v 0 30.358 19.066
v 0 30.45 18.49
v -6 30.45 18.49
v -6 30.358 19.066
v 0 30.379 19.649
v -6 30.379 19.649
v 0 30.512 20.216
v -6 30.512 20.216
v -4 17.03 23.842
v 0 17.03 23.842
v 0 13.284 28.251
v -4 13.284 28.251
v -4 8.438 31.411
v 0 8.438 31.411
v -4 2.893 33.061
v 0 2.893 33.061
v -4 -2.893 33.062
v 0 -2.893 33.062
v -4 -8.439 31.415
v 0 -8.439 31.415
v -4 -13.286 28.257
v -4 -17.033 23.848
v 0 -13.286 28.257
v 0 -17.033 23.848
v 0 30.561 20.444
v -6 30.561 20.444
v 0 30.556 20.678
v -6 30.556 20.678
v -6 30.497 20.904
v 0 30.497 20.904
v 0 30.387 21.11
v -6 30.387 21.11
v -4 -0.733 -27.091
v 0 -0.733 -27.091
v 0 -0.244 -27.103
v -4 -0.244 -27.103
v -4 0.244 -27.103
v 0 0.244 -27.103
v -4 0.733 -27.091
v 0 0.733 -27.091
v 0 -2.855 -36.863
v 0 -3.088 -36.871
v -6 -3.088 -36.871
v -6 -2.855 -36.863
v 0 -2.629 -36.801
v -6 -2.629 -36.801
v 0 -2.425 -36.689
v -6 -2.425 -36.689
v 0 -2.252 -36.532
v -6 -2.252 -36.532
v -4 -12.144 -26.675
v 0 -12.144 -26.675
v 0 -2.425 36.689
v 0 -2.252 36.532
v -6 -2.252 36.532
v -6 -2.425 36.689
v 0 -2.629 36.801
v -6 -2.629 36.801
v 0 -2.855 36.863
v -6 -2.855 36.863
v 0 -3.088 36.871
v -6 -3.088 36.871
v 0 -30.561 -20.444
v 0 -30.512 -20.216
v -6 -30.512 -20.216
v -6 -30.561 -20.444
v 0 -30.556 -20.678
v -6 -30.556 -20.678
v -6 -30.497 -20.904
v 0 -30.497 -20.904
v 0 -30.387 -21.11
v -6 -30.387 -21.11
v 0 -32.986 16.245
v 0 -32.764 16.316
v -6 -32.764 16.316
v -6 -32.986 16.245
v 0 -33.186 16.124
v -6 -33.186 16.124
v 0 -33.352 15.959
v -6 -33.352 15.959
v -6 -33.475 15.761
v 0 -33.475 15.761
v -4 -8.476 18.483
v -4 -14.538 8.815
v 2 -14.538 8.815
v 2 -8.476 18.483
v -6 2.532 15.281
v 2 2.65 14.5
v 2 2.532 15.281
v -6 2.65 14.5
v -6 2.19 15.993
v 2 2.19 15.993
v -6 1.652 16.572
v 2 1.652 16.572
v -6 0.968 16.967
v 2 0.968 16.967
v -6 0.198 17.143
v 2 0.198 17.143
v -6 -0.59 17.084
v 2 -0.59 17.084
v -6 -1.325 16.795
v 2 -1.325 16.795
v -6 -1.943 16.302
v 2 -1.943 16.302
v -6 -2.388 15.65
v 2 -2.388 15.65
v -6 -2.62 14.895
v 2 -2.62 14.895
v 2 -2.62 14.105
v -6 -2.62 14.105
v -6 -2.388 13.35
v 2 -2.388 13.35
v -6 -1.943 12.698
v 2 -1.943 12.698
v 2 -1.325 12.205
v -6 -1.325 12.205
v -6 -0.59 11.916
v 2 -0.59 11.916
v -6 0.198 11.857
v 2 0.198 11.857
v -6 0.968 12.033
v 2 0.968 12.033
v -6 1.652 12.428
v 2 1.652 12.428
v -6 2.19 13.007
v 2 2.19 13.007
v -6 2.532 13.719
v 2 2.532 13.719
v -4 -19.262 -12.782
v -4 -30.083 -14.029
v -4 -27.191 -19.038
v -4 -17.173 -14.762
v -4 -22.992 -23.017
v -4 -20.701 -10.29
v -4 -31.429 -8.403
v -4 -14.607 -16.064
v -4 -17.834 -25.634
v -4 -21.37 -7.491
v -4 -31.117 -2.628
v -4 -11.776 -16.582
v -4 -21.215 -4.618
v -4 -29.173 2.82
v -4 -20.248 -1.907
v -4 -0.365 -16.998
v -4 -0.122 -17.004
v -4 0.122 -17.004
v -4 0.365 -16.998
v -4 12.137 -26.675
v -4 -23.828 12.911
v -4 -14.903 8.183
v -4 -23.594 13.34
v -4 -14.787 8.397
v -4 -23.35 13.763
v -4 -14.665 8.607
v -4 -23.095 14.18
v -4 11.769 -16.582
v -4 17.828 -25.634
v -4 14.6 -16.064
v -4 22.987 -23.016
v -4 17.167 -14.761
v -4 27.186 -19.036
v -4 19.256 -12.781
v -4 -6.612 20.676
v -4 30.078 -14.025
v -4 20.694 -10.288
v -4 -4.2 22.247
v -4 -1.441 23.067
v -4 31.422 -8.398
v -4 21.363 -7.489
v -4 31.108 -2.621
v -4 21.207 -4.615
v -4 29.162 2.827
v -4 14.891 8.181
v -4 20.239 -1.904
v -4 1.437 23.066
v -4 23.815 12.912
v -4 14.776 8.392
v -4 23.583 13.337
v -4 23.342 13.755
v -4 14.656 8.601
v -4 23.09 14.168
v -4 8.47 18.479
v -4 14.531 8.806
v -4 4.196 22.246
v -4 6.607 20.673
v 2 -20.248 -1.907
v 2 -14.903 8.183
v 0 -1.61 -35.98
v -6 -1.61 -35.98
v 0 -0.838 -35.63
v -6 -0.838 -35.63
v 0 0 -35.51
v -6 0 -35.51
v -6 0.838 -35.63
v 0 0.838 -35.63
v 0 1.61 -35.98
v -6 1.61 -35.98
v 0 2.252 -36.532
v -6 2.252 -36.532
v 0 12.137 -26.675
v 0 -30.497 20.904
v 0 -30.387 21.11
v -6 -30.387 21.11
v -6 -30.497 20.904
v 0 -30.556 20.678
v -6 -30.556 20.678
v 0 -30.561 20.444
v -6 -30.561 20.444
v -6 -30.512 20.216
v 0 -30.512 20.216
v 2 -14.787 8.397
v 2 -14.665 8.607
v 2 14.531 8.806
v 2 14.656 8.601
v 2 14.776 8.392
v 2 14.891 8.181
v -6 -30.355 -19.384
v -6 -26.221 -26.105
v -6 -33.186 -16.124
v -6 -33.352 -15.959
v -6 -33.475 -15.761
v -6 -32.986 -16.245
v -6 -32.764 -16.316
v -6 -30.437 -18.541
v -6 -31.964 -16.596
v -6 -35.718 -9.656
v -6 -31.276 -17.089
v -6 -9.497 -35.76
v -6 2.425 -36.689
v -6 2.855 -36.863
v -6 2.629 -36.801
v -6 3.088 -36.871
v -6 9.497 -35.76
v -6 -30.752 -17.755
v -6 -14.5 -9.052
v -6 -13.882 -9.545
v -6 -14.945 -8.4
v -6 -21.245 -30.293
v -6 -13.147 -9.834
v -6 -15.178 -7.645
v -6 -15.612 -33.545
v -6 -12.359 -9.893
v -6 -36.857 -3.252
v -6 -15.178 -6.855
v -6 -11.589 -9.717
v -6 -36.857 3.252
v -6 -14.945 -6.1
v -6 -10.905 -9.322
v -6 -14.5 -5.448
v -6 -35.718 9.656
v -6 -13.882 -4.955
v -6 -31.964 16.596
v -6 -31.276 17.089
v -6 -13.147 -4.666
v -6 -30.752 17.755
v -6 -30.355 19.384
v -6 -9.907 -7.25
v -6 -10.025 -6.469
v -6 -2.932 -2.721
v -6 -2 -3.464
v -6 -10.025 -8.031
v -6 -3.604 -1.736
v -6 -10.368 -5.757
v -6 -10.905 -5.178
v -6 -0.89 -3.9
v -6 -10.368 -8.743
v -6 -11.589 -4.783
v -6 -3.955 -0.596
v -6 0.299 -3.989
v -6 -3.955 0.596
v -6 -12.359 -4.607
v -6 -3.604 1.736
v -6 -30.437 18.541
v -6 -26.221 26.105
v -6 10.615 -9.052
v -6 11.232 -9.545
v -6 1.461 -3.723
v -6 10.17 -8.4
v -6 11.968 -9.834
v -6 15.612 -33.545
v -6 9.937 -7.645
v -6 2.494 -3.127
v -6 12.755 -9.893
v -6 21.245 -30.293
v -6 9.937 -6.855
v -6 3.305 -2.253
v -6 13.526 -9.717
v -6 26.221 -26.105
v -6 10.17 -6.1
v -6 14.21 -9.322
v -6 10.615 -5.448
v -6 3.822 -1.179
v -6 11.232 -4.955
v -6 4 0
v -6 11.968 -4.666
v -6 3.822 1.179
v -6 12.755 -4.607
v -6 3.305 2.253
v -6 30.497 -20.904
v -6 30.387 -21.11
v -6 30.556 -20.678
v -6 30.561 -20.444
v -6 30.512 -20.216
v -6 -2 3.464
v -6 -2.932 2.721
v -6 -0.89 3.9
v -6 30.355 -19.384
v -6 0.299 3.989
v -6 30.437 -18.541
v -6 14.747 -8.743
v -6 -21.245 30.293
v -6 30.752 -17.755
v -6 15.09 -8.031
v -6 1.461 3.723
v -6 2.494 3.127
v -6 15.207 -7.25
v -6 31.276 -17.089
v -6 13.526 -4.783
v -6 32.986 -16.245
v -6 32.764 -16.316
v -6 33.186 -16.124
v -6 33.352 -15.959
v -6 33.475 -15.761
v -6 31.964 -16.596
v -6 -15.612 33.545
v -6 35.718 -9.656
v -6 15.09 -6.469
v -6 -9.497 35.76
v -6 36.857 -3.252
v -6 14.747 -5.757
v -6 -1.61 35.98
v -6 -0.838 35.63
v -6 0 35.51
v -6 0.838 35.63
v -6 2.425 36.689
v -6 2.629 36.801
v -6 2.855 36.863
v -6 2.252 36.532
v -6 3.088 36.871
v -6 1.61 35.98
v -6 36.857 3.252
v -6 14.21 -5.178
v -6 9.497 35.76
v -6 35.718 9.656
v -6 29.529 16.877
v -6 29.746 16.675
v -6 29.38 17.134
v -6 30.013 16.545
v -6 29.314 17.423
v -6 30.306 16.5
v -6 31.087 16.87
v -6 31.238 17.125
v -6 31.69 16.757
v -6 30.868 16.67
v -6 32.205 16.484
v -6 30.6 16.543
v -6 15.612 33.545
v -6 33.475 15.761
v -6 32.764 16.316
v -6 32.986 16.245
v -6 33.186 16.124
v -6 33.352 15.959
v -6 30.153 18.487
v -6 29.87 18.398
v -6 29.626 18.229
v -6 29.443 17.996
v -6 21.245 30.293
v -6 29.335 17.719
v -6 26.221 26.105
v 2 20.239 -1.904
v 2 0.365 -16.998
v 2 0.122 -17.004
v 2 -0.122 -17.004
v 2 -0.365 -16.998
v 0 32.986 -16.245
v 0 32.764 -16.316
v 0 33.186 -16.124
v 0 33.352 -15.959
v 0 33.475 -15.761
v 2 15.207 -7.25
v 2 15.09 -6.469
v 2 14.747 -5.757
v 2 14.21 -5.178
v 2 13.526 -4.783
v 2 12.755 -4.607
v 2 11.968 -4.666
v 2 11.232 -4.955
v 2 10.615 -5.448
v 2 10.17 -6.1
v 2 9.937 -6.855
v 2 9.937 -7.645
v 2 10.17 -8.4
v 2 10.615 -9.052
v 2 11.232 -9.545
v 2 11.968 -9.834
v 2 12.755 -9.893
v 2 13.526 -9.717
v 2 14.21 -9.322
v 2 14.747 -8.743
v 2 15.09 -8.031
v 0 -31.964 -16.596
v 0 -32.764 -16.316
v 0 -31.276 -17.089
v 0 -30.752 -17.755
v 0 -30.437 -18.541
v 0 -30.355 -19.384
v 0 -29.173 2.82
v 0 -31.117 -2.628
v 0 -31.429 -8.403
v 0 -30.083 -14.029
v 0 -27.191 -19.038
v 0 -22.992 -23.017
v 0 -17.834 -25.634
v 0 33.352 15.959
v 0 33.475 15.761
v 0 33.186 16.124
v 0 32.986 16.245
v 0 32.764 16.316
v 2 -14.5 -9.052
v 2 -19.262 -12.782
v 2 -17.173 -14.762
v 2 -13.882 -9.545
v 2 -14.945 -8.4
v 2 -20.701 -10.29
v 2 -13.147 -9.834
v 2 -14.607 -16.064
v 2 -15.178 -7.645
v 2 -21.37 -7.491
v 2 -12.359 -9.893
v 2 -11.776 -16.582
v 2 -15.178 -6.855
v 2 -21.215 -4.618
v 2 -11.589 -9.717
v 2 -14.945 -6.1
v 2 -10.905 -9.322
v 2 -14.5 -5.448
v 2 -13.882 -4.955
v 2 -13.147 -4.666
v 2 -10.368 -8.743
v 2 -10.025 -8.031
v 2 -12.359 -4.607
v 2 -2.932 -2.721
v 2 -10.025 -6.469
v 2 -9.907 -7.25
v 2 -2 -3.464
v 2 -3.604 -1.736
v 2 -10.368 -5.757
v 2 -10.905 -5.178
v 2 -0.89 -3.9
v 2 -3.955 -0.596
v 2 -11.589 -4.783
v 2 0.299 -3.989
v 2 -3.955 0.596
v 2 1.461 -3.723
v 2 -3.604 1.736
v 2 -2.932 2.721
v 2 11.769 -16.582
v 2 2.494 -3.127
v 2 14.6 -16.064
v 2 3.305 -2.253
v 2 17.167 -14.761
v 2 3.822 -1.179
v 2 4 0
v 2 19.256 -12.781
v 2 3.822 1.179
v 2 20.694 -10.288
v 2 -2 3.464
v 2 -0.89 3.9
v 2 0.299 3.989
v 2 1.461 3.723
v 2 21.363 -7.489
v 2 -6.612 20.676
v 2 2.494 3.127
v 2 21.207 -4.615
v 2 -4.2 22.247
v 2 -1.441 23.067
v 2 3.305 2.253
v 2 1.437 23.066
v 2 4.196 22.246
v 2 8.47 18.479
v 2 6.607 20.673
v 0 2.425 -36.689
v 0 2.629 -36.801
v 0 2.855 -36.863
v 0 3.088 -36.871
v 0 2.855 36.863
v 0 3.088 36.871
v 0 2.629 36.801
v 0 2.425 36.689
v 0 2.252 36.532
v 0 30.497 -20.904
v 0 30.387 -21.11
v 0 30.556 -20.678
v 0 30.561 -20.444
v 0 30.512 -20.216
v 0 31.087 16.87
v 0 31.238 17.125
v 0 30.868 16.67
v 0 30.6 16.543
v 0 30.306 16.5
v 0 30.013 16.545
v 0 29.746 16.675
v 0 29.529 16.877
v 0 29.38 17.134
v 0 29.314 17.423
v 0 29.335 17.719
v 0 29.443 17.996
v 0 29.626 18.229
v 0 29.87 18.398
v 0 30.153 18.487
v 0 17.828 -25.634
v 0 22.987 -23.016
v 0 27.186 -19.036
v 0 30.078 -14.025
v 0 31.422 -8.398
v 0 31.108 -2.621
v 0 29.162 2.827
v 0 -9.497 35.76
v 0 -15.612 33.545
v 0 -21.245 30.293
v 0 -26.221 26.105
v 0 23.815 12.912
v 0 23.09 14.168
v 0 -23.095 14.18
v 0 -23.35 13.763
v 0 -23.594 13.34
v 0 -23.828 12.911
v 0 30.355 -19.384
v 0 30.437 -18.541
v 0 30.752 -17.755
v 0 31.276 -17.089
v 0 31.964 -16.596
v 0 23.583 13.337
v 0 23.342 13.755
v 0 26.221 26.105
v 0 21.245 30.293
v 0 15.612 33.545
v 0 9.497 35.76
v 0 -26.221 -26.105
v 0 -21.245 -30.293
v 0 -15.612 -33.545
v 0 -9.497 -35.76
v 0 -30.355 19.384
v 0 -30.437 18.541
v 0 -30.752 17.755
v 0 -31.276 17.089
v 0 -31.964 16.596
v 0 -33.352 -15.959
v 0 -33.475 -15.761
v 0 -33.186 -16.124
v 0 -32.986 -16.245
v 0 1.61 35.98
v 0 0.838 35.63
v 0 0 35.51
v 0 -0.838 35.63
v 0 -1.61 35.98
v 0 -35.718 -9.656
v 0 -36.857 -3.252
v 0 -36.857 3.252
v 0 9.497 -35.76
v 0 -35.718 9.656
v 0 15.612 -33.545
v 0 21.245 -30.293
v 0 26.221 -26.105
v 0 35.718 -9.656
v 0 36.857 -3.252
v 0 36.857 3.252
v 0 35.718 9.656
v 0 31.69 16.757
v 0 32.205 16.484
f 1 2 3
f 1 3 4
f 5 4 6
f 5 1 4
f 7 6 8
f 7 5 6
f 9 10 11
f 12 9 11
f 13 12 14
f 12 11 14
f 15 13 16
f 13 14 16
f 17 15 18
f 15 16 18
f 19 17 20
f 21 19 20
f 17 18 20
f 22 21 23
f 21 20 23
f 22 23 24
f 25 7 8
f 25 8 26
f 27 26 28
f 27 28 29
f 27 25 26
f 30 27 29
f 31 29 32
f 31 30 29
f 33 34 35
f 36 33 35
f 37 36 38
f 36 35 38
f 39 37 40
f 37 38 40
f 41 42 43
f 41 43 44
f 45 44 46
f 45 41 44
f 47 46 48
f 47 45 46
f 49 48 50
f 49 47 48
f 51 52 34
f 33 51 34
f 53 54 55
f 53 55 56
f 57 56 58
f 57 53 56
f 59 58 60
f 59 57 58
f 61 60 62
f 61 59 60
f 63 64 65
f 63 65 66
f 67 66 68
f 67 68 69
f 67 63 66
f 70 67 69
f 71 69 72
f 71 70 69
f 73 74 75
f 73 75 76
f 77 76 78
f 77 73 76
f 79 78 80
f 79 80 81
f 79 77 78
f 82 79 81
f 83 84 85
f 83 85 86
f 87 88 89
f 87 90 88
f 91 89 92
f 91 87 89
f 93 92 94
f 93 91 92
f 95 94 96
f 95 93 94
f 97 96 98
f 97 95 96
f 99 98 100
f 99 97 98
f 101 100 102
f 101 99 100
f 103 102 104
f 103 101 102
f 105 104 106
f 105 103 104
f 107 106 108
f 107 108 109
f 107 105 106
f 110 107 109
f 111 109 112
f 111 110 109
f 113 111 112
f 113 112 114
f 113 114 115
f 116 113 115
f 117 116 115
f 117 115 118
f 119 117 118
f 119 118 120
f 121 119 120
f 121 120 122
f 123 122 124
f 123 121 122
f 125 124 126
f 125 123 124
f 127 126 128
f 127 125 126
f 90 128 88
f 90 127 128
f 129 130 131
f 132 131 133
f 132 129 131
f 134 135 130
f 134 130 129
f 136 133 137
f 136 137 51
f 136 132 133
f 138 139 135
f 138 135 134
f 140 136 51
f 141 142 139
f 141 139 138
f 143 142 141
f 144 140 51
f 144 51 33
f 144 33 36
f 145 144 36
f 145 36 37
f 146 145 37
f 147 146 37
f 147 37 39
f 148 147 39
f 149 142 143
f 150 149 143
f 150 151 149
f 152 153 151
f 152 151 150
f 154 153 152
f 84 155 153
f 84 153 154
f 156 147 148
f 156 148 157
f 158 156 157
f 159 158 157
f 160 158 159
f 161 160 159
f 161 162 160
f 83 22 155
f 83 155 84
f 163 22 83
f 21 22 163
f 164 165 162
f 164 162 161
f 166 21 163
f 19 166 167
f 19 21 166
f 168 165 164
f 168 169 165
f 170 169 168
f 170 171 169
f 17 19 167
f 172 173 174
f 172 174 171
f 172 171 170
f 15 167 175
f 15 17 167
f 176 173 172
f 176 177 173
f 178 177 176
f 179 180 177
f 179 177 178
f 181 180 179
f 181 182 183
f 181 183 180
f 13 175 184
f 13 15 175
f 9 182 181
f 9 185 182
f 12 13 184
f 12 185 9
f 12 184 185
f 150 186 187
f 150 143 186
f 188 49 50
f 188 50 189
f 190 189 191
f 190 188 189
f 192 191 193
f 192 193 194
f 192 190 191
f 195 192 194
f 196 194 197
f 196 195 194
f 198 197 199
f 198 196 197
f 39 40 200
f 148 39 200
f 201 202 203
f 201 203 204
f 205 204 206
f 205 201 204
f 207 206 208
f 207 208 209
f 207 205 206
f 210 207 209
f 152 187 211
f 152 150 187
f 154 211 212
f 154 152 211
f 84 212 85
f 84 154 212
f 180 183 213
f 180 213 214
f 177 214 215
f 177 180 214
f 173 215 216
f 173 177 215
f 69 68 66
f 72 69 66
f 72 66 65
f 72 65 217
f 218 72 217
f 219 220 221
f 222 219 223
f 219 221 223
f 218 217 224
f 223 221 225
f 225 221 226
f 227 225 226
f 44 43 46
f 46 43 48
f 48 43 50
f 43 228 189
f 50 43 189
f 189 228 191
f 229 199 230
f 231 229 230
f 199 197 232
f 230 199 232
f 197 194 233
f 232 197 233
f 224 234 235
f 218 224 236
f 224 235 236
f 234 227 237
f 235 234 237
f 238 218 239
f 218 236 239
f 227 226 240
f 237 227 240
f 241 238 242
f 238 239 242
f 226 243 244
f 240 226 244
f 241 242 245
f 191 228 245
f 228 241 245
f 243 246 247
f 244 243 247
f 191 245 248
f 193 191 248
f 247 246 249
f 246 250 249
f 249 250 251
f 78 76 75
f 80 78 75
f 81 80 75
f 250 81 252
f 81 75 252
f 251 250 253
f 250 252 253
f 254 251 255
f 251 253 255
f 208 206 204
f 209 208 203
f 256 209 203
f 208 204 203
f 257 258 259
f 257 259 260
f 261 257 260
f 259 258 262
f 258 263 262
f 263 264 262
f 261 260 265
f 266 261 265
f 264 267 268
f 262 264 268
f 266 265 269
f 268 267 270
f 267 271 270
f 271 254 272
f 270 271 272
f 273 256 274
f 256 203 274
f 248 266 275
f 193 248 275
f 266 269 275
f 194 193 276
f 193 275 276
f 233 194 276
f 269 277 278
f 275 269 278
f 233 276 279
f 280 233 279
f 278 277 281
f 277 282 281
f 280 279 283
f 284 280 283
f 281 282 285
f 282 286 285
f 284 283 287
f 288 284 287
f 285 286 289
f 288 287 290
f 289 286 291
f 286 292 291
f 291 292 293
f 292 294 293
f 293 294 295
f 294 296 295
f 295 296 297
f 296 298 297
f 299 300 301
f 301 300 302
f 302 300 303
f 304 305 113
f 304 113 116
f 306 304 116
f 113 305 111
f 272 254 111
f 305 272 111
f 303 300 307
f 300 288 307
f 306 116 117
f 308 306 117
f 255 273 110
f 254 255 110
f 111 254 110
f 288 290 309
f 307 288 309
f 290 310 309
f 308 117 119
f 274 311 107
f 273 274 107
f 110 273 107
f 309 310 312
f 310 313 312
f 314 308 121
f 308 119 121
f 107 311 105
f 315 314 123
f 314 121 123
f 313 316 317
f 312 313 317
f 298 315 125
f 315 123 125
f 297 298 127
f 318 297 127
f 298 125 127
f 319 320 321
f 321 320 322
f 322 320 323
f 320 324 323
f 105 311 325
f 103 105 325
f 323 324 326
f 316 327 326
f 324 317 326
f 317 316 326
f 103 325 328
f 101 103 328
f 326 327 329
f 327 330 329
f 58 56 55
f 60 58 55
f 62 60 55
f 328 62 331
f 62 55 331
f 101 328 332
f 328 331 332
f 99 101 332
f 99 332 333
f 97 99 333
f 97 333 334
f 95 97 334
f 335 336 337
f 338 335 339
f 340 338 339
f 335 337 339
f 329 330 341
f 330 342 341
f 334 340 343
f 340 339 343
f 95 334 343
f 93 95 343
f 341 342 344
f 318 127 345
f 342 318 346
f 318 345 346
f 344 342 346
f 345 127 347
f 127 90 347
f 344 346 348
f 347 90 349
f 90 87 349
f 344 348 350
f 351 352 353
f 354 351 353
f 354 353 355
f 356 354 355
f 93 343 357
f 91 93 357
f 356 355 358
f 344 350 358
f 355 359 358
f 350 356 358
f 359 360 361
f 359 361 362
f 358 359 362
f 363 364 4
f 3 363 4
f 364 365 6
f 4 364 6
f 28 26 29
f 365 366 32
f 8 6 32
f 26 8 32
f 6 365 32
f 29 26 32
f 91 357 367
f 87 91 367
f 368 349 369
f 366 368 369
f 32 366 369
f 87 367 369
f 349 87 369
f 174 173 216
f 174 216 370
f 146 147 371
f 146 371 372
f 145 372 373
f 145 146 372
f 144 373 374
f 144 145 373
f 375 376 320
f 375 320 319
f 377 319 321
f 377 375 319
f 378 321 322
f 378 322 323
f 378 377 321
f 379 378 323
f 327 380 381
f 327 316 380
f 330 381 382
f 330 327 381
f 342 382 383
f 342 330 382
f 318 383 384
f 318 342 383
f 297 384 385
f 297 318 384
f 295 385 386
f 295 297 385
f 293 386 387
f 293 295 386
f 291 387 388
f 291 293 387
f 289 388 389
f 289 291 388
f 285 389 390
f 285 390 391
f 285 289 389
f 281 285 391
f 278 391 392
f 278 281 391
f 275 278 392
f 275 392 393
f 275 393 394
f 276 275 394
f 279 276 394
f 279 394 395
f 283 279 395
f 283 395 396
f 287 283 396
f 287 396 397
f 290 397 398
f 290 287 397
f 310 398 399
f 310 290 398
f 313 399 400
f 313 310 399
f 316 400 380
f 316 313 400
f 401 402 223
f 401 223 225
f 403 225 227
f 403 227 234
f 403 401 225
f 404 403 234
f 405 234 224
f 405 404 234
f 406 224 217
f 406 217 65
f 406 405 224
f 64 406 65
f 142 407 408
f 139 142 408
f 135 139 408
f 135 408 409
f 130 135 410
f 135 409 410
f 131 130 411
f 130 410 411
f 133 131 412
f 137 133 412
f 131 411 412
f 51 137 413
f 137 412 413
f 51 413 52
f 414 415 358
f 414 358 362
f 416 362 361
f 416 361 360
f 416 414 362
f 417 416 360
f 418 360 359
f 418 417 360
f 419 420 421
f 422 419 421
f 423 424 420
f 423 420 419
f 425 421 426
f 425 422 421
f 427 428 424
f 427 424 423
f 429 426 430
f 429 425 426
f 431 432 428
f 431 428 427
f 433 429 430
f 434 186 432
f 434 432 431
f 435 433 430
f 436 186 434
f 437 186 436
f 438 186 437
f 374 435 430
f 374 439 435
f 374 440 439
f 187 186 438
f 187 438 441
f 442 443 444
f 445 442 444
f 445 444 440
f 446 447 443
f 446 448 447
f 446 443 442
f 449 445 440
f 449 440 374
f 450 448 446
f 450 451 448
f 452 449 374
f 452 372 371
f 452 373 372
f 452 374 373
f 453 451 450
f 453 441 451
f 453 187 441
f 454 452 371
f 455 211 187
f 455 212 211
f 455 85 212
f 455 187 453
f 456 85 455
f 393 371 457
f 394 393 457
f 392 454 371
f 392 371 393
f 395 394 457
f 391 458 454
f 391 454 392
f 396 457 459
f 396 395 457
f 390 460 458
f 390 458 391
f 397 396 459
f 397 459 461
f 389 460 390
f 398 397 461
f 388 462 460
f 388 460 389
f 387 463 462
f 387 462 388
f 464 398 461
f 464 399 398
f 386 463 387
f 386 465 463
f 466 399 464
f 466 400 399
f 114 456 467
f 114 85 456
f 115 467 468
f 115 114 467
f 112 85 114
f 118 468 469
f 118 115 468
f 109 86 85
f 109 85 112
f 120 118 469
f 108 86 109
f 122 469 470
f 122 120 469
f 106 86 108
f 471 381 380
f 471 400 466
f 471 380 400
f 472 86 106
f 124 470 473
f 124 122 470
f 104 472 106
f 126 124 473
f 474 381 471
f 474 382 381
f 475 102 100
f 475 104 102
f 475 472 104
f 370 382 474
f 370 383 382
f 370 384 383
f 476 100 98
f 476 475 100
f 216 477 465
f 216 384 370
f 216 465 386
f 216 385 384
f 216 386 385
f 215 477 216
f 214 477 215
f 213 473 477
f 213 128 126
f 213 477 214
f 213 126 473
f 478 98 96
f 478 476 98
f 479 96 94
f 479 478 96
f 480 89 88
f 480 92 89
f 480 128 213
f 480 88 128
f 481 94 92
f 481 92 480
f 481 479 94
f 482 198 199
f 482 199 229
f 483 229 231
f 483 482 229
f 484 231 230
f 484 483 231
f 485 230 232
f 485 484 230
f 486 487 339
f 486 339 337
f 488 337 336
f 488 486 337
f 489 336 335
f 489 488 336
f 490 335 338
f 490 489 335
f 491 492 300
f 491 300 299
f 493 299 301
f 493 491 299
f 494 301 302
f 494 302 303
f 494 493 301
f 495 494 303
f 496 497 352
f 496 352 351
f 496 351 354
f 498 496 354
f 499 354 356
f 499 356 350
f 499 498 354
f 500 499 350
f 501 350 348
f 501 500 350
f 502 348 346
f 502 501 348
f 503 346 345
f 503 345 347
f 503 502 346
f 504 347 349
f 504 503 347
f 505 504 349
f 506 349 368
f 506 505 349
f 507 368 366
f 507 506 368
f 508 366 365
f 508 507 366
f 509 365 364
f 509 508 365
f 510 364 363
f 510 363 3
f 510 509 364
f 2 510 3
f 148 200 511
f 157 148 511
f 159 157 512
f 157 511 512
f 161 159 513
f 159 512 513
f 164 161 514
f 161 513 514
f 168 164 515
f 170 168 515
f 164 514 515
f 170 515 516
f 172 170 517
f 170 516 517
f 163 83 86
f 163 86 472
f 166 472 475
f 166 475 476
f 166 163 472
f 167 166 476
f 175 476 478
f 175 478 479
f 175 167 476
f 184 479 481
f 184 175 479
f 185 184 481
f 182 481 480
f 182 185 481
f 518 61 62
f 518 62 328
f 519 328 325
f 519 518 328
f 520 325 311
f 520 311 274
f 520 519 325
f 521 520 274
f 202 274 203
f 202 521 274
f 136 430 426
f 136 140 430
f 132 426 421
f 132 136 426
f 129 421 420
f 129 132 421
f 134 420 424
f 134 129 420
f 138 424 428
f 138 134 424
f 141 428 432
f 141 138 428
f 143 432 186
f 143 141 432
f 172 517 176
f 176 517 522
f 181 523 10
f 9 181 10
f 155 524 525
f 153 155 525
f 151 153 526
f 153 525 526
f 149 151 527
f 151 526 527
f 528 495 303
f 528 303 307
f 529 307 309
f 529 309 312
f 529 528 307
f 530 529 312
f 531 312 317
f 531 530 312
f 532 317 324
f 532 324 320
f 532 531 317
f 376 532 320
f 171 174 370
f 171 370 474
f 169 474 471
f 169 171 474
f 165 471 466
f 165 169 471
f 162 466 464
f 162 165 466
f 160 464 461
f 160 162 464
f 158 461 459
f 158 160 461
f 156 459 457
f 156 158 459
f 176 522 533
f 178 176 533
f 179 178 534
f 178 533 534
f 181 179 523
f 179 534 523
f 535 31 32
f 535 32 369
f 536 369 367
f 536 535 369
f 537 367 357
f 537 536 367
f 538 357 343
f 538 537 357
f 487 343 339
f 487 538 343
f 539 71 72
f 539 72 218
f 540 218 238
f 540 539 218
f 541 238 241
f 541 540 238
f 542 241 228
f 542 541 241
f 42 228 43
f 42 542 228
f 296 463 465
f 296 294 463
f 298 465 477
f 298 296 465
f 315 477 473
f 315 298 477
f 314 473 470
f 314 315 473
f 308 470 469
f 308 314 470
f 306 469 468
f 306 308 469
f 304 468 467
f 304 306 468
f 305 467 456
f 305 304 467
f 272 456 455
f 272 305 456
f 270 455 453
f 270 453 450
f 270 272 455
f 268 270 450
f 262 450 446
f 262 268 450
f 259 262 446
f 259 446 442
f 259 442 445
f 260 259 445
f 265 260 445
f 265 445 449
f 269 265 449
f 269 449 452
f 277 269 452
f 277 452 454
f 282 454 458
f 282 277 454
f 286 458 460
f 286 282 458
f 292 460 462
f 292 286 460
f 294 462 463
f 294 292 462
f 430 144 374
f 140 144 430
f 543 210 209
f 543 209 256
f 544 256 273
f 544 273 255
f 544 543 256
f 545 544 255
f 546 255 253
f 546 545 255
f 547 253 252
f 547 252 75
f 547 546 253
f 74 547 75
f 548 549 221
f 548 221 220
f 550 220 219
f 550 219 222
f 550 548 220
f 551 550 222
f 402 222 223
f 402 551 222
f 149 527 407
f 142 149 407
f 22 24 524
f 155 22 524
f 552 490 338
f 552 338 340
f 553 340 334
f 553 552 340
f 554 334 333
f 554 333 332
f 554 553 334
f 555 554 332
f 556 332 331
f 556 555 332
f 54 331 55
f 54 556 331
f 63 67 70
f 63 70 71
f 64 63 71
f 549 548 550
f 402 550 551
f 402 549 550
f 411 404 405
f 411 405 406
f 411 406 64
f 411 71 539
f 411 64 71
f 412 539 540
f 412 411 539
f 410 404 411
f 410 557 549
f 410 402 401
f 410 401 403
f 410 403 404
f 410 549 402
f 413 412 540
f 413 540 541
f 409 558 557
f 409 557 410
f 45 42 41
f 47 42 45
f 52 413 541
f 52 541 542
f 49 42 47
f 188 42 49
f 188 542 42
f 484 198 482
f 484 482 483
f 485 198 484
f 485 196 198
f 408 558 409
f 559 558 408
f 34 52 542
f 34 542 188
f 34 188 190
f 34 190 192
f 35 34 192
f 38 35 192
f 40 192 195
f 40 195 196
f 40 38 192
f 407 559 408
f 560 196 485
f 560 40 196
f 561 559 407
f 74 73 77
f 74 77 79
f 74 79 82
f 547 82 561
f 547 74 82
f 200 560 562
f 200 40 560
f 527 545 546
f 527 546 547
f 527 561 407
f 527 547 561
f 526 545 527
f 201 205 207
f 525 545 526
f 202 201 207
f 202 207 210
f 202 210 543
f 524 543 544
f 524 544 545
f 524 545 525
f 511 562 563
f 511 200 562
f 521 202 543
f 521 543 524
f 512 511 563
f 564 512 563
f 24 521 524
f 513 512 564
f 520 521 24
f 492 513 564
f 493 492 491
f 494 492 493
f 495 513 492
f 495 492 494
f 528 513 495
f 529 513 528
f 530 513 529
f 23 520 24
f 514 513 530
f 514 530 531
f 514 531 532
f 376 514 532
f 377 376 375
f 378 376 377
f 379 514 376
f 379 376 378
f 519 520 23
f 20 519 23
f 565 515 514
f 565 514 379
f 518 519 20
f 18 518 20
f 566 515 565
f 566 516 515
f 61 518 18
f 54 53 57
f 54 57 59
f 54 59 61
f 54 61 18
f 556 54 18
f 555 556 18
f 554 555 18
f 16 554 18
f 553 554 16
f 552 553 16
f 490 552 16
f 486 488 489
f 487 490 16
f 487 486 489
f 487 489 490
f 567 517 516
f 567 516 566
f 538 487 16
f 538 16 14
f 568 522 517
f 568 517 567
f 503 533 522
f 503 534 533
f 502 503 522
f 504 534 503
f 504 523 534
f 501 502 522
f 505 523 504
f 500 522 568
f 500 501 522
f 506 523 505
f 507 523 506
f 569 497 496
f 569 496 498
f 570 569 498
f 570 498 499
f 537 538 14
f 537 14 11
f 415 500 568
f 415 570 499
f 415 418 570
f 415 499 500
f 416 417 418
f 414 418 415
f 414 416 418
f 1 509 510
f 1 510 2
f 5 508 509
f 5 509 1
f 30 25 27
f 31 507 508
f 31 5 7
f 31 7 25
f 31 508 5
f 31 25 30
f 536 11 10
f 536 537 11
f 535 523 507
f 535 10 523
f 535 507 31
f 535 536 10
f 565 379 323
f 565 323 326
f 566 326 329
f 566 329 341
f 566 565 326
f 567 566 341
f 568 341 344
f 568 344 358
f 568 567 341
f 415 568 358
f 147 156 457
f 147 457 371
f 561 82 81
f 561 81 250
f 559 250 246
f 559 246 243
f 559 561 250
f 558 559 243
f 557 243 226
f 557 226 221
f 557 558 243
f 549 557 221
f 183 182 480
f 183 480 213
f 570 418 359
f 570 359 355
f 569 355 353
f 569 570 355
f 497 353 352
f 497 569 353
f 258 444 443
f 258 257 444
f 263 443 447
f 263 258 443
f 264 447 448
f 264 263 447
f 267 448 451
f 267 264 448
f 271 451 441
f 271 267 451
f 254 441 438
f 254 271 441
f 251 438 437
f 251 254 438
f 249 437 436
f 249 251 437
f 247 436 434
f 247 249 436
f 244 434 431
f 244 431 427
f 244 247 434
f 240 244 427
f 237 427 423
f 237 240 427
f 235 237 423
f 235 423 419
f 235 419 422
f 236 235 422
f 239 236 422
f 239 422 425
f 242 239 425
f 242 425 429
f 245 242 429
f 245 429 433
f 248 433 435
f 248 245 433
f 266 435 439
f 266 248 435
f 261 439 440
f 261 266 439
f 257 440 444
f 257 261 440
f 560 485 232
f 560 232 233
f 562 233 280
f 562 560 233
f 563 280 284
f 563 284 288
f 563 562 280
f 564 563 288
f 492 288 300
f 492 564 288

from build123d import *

# Parameters (mm, degrees)
F0_R     = 2.65
F0_R_2   = 4
F1_DEPTH = 6
F2_DEPTH = 4
F3_DEPTH = 2


with BuildPart() as f1:
    # F0 (on Right) → F1 (new body)
    with BuildSketch(Plane.YZ):
        with BuildLine():
            ThreePointArc((-2.2515407231, 36.53242851), (-2.6294191421, 36.8013801393), (-3.0879953604, 36.8709138028))
            ThreePointArc((-3.0879953604, 36.8709138028), (-18.5, 32.04293994), (-30.3871503338, 21.1097393303))
            ThreePointArc((-30.3871503338, 21.1097393303), (-30.5562205239, 20.6778338439), (-30.5122407901, 20.2161057189))
            ThreePointArc((-30.5122407901, 20.2161057189), (-30.7524645978, 17.7549437138), (-32.7637815132, 16.3163227911))
            ThreePointArc((-32.7637815132, 16.3163227911), (-33.185639666, 16.1235462954), (-33.4751456942, 15.7611744725))
            ThreePointArc((-33.4751456942, 15.7611744725), (-37, 0), (-33.4751456942, -15.7611744725))
            ThreePointArc((-33.4751456942, -15.7611744725), (-33.185639666, -16.1235462954), (-32.7637815132, -16.3163227911))
            ThreePointArc((-32.7637815132, -16.3163227911), (-30.7524645978, -17.7549437138), (-30.5122407901, -20.2161057189))
            ThreePointArc((-30.5122407901, -20.2161057189), (-30.5562205239, -20.6778338439), (-30.3871503338, -21.1097393303))
            ThreePointArc((-30.3871503338, -21.1097393303), (-18.5, -32.04293994), (-3.0879953604, -36.8709138028))
            ThreePointArc((-3.0879953604, -36.8709138028), (-2.6294191421, -36.8013801393), (-2.2515407231, -36.53242851))
            ThreePointArc((-2.2515407231, -36.53242851), (0, -35.5098874275), (2.2515407231, -36.53242851))
            ThreePointArc((2.2515407231, -36.53242851), (2.6294191421, -36.8013801393), (3.0879953604, -36.8709138028))
            ThreePointArc((3.0879953604, -36.8709138028), (18.5, -32.04293994), (30.3871503338, -21.1097393303))
            ThreePointArc((30.3871503338, -21.1097393303), (30.5562205239, -20.6778338439), (30.5122407901, -20.2161057189))
            ThreePointArc((30.5122407901, -20.2161057189), (30.7524645978, -17.7549437138), (32.7637815132, -16.3163227911))
            ThreePointArc((32.7637815132, -16.3163227911), (33.185639666, -16.1235462954), (33.4751456942, -15.7611744725))
            ThreePointArc((33.4751456942, -15.7611744725), (37, 0), (33.4751456942, 15.7611744725))
            ThreePointArc((33.4751456942, 15.7611744725), (33.185639666, 16.1235462954), (32.7637815132, 16.3163227911))
            ThreePointArc((32.7637815132, 16.3163227911), (31.941237039, 16.6082774884), (31.2380455813, 17.1253255822))
            ThreePointArc((31.2380455813, 17.1253255822), (29.4448637287, 17), (30.449989793, 18.4902782469))
            ThreePointArc((30.449989793, 18.4902782469), (30.3538087376, 19.3577839598), (30.5122407901, 20.2161057189))
            ThreePointArc((30.5122407901, 20.2161057189), (30.5562205239, 20.6778338439), (30.3871503338, 21.1097393303))
            ThreePointArc((30.3871503338, 21.1097393303), (18.5, 32.04293994), (3.0879953604, 36.8709138028))
            ThreePointArc((3.0879953604, 36.8709138028), (2.6294191421, 36.8013801393), (2.2515407231, 36.53242851))
            ThreePointArc((2.2515407231, 36.53242851), (0, 35.5098874275), (-2.2515407231, 36.53242851))
        make_face()
        with BuildLine():
            Line((-23.0952370323, 14.180454946), (-17.0328632471, 23.8484731203))
            ThreePointArc((-17.0328632471, 23.8484731203), (0.0002590164, 33.2703478915), (17.0295377344, 23.8415279974))
            Line((17.0295377344, 23.8415279974), (23.0899184639, 14.167925942))
            ThreePointArc((23.0899184639, 14.167925942), (23.4636524397, 13.5467460522), (23.8147430167, 12.9124929901))
            Line((23.8147430167, 12.9124929901), (29.162137778, 2.827248294))
            ThreePointArc((29.162137778, 2.827248294), (28.813095975, -16.6349496309), (12.1369519401, -26.6751288313))
            Line((12.1369519401, -26.6751288313), (0.7330157043, -27.0912894495))
            ThreePointArc((0.7330157043, -27.0912894495), (0, -27.1046598669), (-0.7330157043, -27.0912894495))
            Line((-0.7330157043, -27.0912894495), (-12.1441739659, -26.6748652799))
            ThreePointArc((-12.1441739659, -26.6748652799), (-28.8182692269, -16.6382354957), (-29.1731979579, 2.8202694775))
            Line((-29.1731979579, 2.8202694775), (-23.8282527367, 12.9108345034))
            ThreePointArc((-23.8282527367, 12.9108345034), (-23.4733240056, 13.5523299334), (-23.0952370323, 14.180454946))
        make_face(mode=Mode.SUBTRACT)
        with BuildLine():
            ThreePointArc((17.0295377344, 23.8415279974), (0.0002590164, 33.2703478915), (-17.0328632471, 23.8484731203))
            Line((-17.0328632471, 23.8484731203), (-23.0952370323, 14.180454946))
            ThreePointArc((-23.0952370323, 14.180454946), (-23.4733240056, 13.5523299334), (-23.8282527367, 12.9108345034))
            Line((-23.8282527367, 12.9108345034), (-29.1731979579, 2.8202694775))
            ThreePointArc((-29.1731979579, 2.8202694775), (-28.8182692269, -16.6382354957), (-12.1441739659, -26.6748652799))
            Line((-12.1441739659, -26.6748652799), (-0.7330157043, -27.0912894495))
            ThreePointArc((-0.7330157043, -27.0912894495), (0, -27.1046598669), (0.7330157043, -27.0912894495))
            Line((0.7330157043, -27.0912894495), (12.1369519401, -26.6751288313))
            ThreePointArc((12.1369519401, -26.6751288313), (28.813095975, -16.6349496309), (29.162137778, 2.827248294))
            Line((29.162137778, 2.827248294), (23.8147430167, 12.9124929901))
            ThreePointArc((23.8147430167, 12.9124929901), (23.4636524397, 13.5467460522), (23.0899184639, 14.167925942))
            Line((23.0899184639, 14.167925942), (17.0295377344, 23.8415279974))
        make_face()
        with BuildLine():
            Line((-14.5383641102, 8.8148297318), (-8.4759903249, 18.482847906))
            ThreePointArc((-8.4759903249, 18.482847906), (-0.0018003141, 23.1703476982), (8.4704774851, 18.4793926211))
            Line((8.4704774851, 18.4793926211), (14.5308582146, 8.8057905657))
            ThreePointArc((14.5308582146, 8.8057905657), (14.7167955123, 8.4967458506), (14.8914674376, 8.1811970698))
            Line((14.8914674376, 8.1811970698), (20.2388621989, -1.9040476263))
            ThreePointArc((20.2388621989, -1.9040476263), (20.0652095641, -11.5867329668), (11.7686206585, -16.5818468966))
            Line((11.7686206585, -16.5818468966), (0.3646844227, -16.9980075148))
            ThreePointArc((0.3646844227, -16.9980075148), (0, -17.0046594636), (-0.3646844227, -16.9980075148))
            Line((-0.3646844227, -16.9980075148), (-11.7758426843, -16.5815833453))
            ThreePointArc((-11.7758426843, -16.5815833453), (-20.0714122995, -11.5882352941), (-20.2479937541, -1.9073872429))
            Line((-20.2479937541, -1.9073872429), (-14.9030485329, 8.183177783))
            ThreePointArc((-14.9030485329, 8.183177783), (-14.7264670782, 8.5023297318), (-14.5383641102, 8.8148297318))
        make_face(mode=Mode.SUBTRACT)
        with BuildLine():
            ThreePointArc((8.4704774851, 18.4793926211), (-0.0018003141, 23.1703476982), (-8.4759903249, 18.482847906))
            Line((-8.4759903249, 18.482847906), (-14.5383641102, 8.8148297318))
            ThreePointArc((-14.5383641102, 8.8148297318), (-14.7264670782, 8.5023297318), (-14.9030485329, 8.183177783))
            Line((-14.9030485329, 8.183177783), (-20.2479937541, -1.9073872429))
            ThreePointArc((-20.2479937541, -1.9073872429), (-20.0714122995, -11.5882352941), (-11.7758426843, -16.5815833453))
            Line((-11.7758426843, -16.5815833453), (-0.3646844227, -16.9980075148))
            ThreePointArc((-0.3646844227, -16.9980075148), (0, -17.0046594636), (0.3646844227, -16.9980075148))
            Line((0.3646844227, -16.9980075148), (11.7686206585, -16.5818468966))
            ThreePointArc((11.7686206585, -16.5818468966), (20.0652095641, -11.5867329668), (20.2388621989, -1.9040476263))
            Line((20.2388621989, -1.9040476263), (14.8914674376, 8.1811970698))
            ThreePointArc((14.8914674376, 8.1811970698), (14.7167955123, 8.4967458506), (14.5308582146, 8.8057905657))
            Line((14.5308582146, 8.8057905657), (8.4704774851, 18.4793926211))
        make_face()
        with Locations((-12.5573683549, -7.25)):
            Circle(F0_R, mode=Mode.SUBTRACT)
        with Locations((12.5573683549, -7.25)):
            Circle(F0_R, mode=Mode.SUBTRACT)
        Circle(F0_R_2, mode=Mode.SUBTRACT)
        with Locations((0, 14.5)):
            Circle(F0_R, mode=Mode.SUBTRACT)
    extrude(amount=-F1_DEPTH)

    # F0 (on Right) → F2 (cut)
    with BuildSketch(Plane.YZ):
        with BuildLine():
            ThreePointArc((17.0295377344, 23.8415279974), (0.0002590164, 33.2703478915), (-17.0328632471, 23.8484731203))
            Line((-17.0328632471, 23.8484731203), (-23.0952370323, 14.180454946))
            ThreePointArc((-23.0952370323, 14.180454946), (-23.4733240056, 13.5523299334), (-23.8282527367, 12.9108345034))
            Line((-23.8282527367, 12.9108345034), (-29.1731979579, 2.8202694775))
            ThreePointArc((-29.1731979579, 2.8202694775), (-28.8182692269, -16.6382354957), (-12.1441739659, -26.6748652799))
            Line((-12.1441739659, -26.6748652799), (-0.7330157043, -27.0912894495))
            ThreePointArc((-0.7330157043, -27.0912894495), (0, -27.1046598669), (0.7330157043, -27.0912894495))
            Line((0.7330157043, -27.0912894495), (12.1369519401, -26.6751288313))
            ThreePointArc((12.1369519401, -26.6751288313), (28.813095975, -16.6349496309), (29.162137778, 2.827248294))
            Line((29.162137778, 2.827248294), (23.8147430167, 12.9124929901))
            ThreePointArc((23.8147430167, 12.9124929901), (23.4636524397, 13.5467460522), (23.0899184639, 14.167925942))
            Line((23.0899184639, 14.167925942), (17.0295377344, 23.8415279974))
        make_face()
        with BuildLine():
            Line((-14.5383641102, 8.8148297318), (-8.4759903249, 18.482847906))
            ThreePointArc((-8.4759903249, 18.482847906), (-0.0018003141, 23.1703476982), (8.4704774851, 18.4793926211))
            Line((8.4704774851, 18.4793926211), (14.5308582146, 8.8057905657))
            ThreePointArc((14.5308582146, 8.8057905657), (14.7167955123, 8.4967458506), (14.8914674376, 8.1811970698))
            Line((14.8914674376, 8.1811970698), (20.2388621989, -1.9040476263))
            ThreePointArc((20.2388621989, -1.9040476263), (20.0652095641, -11.5867329668), (11.7686206585, -16.5818468966))
            Line((11.7686206585, -16.5818468966), (0.3646844227, -16.9980075148))
            ThreePointArc((0.3646844227, -16.9980075148), (0, -17.0046594636), (-0.3646844227, -16.9980075148))
            Line((-0.3646844227, -16.9980075148), (-11.7758426843, -16.5815833453))
            ThreePointArc((-11.7758426843, -16.5815833453), (-20.0714122995, -11.5882352941), (-20.2479937541, -1.9073872429))
            Line((-20.2479937541, -1.9073872429), (-14.9030485329, 8.183177783))
            ThreePointArc((-14.9030485329, 8.183177783), (-14.7264670782, 8.5023297318), (-14.5383641102, 8.8148297318))
        make_face(mode=Mode.SUBTRACT)
    extrude(amount=-F2_DEPTH, mode=Mode.SUBTRACT)

    # F3 (add): a face of the model
    f3_faces = [f1.faces().sort_by_distance(p)[0] for p in [
        (0, -11.0097556238, 13.3369283968),
    ]]
    extrude(f3_faces, amount=F3_DEPTH)


solid = f1.part
